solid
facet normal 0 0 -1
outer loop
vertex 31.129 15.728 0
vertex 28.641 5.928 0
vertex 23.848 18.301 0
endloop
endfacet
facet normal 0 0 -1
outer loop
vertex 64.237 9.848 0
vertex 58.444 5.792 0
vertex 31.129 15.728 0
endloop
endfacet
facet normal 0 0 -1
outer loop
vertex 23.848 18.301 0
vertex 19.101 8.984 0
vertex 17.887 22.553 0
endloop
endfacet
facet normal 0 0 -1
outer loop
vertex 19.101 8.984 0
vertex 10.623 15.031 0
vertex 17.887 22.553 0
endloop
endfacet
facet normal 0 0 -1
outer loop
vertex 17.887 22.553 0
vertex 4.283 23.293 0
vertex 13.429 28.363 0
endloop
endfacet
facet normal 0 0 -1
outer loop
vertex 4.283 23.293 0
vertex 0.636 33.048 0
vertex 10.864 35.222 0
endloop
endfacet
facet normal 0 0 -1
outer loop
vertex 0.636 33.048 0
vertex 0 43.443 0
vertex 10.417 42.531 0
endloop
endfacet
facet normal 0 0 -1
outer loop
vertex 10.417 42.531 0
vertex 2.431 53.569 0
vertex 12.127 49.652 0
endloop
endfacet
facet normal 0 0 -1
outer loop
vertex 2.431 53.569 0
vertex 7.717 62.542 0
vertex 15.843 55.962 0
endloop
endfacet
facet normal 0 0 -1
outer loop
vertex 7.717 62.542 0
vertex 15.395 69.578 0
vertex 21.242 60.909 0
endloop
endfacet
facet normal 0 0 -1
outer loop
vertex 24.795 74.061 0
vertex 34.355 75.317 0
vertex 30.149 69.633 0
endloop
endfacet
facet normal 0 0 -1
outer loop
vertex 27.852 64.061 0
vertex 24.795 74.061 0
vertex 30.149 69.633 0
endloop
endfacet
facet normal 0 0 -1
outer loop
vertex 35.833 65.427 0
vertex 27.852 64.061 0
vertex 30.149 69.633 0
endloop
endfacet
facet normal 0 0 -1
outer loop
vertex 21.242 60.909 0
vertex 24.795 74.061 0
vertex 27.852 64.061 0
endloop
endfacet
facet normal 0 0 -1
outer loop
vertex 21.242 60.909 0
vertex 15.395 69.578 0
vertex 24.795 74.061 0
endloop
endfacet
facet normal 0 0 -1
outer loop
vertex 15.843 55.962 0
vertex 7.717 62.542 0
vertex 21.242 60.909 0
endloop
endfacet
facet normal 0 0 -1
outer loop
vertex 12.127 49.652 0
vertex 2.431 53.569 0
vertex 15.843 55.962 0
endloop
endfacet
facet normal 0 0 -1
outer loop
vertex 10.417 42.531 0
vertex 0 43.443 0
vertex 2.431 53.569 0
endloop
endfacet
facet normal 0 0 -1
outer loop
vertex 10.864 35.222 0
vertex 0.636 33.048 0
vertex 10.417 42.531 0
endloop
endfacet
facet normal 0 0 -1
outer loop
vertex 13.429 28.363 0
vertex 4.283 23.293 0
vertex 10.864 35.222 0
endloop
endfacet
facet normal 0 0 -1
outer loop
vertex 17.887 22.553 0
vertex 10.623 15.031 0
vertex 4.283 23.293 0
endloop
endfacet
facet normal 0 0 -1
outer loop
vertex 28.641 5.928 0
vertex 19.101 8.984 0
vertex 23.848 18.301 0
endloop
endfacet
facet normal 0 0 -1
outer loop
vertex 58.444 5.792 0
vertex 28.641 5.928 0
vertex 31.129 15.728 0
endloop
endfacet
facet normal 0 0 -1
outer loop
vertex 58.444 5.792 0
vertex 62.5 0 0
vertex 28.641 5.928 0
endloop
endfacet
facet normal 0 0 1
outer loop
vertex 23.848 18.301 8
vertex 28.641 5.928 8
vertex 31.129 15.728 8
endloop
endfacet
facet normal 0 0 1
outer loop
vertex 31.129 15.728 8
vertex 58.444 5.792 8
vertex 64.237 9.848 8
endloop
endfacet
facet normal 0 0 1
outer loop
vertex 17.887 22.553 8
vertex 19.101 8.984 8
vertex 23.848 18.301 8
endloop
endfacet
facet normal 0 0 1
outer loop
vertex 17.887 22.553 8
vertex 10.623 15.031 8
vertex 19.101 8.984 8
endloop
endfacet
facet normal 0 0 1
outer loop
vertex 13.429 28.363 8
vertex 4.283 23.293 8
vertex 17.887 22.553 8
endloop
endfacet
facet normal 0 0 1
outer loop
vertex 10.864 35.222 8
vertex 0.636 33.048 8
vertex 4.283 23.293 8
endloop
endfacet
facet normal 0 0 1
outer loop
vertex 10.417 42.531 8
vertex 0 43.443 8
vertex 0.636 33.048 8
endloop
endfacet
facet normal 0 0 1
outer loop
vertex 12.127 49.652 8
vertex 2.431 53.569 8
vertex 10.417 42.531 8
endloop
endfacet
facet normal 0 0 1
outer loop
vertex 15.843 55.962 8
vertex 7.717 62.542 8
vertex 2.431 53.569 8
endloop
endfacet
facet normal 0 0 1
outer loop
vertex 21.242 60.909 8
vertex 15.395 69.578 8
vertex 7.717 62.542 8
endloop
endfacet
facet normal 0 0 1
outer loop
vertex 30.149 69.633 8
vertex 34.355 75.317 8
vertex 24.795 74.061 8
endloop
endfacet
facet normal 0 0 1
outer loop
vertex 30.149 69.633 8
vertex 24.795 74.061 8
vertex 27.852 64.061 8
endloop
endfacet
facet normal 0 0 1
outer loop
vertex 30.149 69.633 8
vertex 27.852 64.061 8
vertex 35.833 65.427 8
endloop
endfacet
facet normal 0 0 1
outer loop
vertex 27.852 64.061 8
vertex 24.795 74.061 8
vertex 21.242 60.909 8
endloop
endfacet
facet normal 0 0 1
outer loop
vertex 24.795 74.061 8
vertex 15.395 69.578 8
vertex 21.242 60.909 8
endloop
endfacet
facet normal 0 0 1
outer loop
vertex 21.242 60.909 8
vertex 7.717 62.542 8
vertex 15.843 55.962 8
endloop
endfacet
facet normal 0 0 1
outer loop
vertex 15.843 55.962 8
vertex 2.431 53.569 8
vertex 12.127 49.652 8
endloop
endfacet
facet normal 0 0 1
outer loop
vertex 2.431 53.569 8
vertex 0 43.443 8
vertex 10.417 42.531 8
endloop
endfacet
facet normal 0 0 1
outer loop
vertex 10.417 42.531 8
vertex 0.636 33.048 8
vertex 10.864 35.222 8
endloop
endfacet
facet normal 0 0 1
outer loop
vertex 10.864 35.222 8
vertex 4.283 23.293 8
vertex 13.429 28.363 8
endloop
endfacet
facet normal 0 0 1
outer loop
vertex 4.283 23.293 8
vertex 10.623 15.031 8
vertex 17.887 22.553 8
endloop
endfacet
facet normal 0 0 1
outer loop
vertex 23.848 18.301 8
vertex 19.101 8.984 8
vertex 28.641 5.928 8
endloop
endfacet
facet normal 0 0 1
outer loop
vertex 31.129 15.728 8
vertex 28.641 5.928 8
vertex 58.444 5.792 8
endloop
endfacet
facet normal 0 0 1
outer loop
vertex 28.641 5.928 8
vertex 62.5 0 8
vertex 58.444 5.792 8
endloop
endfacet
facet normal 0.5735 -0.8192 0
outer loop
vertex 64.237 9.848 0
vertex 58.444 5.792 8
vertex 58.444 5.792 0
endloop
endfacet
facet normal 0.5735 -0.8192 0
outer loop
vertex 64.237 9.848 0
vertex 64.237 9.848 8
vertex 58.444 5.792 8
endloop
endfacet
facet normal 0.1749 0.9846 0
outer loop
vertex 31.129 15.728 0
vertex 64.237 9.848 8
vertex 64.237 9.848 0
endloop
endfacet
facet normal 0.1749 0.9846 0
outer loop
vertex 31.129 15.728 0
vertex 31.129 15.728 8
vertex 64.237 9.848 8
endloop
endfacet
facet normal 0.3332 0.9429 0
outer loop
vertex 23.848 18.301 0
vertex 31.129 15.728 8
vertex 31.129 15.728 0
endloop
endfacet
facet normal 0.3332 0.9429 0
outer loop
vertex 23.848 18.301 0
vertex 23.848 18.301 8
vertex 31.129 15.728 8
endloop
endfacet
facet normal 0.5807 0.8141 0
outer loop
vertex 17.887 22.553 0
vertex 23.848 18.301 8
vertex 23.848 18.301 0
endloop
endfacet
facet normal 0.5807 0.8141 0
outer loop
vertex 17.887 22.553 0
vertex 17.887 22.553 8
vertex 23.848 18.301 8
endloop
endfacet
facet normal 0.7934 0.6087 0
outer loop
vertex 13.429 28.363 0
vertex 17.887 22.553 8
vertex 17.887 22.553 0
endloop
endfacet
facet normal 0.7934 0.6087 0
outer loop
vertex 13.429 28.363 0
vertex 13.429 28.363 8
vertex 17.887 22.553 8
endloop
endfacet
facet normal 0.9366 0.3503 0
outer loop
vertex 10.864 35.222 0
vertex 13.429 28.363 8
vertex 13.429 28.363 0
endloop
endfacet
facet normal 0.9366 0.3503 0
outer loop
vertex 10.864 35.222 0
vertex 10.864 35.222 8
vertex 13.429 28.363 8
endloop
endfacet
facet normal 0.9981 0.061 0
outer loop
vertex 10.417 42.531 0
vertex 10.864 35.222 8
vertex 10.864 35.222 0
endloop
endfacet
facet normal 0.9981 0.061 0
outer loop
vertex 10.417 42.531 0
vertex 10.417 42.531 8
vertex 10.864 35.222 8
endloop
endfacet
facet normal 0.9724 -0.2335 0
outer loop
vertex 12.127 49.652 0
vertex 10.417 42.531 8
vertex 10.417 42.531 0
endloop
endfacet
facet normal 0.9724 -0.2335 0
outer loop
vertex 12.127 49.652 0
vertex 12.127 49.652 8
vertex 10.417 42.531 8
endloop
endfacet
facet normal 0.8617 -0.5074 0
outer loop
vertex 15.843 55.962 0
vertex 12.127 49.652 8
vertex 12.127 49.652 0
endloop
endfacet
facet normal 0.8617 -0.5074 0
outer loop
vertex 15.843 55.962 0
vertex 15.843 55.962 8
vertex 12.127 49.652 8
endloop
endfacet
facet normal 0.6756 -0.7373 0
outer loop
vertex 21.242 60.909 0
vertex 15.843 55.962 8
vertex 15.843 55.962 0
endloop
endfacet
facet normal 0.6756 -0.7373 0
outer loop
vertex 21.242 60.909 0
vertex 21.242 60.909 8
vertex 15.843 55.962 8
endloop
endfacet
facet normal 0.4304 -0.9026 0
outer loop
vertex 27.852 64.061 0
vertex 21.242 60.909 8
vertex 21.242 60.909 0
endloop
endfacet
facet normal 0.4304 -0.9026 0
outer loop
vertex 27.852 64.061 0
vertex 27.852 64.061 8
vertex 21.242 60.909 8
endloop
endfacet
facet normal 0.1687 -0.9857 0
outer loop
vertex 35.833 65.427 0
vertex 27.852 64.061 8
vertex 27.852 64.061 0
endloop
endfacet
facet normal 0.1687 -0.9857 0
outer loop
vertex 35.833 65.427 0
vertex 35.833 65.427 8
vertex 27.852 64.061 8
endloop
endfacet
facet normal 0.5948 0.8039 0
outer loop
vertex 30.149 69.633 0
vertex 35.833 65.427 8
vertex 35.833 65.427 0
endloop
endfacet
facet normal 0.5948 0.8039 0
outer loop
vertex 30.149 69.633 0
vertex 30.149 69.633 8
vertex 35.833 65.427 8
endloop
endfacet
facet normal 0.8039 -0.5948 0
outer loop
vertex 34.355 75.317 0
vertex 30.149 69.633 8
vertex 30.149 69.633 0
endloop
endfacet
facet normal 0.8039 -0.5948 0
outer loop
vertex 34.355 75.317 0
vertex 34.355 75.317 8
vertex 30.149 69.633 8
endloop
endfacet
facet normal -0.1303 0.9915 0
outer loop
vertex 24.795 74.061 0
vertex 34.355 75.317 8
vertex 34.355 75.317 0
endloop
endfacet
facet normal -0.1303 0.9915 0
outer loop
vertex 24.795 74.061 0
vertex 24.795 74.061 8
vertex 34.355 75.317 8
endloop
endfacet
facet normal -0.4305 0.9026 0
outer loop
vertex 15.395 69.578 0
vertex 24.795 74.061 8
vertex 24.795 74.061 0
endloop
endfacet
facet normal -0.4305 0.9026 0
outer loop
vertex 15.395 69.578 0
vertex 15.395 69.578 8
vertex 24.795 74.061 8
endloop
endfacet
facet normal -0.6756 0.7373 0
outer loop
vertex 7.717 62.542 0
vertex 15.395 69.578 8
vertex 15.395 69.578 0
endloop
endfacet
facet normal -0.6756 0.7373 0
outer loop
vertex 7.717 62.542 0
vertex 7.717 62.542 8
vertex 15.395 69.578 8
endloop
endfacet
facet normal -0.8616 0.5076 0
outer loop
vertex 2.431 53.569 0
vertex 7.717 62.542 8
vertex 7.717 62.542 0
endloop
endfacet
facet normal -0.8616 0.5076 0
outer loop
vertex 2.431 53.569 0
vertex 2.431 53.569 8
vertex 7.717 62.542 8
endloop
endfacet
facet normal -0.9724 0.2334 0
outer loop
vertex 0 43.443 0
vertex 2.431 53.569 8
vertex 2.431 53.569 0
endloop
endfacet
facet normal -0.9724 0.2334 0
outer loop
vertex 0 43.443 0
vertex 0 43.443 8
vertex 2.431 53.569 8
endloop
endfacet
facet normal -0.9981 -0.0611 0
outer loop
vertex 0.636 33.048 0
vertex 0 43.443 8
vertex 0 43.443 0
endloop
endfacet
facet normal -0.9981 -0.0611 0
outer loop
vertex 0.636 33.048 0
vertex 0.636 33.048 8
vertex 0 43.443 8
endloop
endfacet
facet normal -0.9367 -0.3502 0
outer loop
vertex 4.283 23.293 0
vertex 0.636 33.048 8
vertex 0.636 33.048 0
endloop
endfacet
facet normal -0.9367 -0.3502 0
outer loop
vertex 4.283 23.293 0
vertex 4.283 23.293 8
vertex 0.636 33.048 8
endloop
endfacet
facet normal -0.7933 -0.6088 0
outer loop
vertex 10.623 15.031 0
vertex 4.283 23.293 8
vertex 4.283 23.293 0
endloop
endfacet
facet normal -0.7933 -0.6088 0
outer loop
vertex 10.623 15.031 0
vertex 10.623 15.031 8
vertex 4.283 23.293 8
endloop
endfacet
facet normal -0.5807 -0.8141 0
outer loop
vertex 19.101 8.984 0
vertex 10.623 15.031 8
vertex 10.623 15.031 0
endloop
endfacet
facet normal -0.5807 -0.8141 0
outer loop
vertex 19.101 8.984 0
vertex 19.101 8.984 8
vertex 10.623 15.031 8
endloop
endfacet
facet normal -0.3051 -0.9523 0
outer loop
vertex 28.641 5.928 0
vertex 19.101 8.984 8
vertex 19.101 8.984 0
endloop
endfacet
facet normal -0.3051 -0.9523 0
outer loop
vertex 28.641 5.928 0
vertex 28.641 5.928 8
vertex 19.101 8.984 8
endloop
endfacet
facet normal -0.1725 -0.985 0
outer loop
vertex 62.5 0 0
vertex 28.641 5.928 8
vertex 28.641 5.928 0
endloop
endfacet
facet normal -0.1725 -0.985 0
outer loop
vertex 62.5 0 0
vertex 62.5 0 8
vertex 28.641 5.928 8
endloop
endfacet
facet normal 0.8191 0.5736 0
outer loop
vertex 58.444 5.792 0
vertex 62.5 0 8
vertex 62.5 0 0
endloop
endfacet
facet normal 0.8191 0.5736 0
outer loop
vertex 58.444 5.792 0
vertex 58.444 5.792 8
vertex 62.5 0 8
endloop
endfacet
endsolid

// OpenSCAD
$fn = 32;

// ----------------------------------------------------------------------
// Hook plate: curl radius 30 mm over 170 degrees, 10 mm thick band
// ----------------------------------------------------------------------

// --- parameters (mm) ---
profile_height = 8;       // extrusion height
profile_points = 26;      // points of the closed outline

profile = [[30.149, 69.633], [34.355, 75.317], [24.795, 74.061], [15.395, 69.578], [7.717, 62.542], [2.431, 53.569], [0, 43.443], [0.636, 33.048], [4.283, 23.293], [10.623, 15.031], [19.101, 8.984], [28.641, 5.928], [62.5, 0], [58.444, 5.792], [64.237, 9.848], [31.129, 15.728], [23.848, 18.301], [17.887, 22.553], [13.429, 28.363], [10.864, 35.222], [10.417, 42.531], [12.127, 49.652], [15.843, 55.962], [21.242, 60.909], [27.852, 64.061], [35.833, 65.427]];  // single closed polygon, 26 points, counter clockwise

// --- the one profile operation ---
linear_extrude(height = profile_height) polygon(points = profile);
